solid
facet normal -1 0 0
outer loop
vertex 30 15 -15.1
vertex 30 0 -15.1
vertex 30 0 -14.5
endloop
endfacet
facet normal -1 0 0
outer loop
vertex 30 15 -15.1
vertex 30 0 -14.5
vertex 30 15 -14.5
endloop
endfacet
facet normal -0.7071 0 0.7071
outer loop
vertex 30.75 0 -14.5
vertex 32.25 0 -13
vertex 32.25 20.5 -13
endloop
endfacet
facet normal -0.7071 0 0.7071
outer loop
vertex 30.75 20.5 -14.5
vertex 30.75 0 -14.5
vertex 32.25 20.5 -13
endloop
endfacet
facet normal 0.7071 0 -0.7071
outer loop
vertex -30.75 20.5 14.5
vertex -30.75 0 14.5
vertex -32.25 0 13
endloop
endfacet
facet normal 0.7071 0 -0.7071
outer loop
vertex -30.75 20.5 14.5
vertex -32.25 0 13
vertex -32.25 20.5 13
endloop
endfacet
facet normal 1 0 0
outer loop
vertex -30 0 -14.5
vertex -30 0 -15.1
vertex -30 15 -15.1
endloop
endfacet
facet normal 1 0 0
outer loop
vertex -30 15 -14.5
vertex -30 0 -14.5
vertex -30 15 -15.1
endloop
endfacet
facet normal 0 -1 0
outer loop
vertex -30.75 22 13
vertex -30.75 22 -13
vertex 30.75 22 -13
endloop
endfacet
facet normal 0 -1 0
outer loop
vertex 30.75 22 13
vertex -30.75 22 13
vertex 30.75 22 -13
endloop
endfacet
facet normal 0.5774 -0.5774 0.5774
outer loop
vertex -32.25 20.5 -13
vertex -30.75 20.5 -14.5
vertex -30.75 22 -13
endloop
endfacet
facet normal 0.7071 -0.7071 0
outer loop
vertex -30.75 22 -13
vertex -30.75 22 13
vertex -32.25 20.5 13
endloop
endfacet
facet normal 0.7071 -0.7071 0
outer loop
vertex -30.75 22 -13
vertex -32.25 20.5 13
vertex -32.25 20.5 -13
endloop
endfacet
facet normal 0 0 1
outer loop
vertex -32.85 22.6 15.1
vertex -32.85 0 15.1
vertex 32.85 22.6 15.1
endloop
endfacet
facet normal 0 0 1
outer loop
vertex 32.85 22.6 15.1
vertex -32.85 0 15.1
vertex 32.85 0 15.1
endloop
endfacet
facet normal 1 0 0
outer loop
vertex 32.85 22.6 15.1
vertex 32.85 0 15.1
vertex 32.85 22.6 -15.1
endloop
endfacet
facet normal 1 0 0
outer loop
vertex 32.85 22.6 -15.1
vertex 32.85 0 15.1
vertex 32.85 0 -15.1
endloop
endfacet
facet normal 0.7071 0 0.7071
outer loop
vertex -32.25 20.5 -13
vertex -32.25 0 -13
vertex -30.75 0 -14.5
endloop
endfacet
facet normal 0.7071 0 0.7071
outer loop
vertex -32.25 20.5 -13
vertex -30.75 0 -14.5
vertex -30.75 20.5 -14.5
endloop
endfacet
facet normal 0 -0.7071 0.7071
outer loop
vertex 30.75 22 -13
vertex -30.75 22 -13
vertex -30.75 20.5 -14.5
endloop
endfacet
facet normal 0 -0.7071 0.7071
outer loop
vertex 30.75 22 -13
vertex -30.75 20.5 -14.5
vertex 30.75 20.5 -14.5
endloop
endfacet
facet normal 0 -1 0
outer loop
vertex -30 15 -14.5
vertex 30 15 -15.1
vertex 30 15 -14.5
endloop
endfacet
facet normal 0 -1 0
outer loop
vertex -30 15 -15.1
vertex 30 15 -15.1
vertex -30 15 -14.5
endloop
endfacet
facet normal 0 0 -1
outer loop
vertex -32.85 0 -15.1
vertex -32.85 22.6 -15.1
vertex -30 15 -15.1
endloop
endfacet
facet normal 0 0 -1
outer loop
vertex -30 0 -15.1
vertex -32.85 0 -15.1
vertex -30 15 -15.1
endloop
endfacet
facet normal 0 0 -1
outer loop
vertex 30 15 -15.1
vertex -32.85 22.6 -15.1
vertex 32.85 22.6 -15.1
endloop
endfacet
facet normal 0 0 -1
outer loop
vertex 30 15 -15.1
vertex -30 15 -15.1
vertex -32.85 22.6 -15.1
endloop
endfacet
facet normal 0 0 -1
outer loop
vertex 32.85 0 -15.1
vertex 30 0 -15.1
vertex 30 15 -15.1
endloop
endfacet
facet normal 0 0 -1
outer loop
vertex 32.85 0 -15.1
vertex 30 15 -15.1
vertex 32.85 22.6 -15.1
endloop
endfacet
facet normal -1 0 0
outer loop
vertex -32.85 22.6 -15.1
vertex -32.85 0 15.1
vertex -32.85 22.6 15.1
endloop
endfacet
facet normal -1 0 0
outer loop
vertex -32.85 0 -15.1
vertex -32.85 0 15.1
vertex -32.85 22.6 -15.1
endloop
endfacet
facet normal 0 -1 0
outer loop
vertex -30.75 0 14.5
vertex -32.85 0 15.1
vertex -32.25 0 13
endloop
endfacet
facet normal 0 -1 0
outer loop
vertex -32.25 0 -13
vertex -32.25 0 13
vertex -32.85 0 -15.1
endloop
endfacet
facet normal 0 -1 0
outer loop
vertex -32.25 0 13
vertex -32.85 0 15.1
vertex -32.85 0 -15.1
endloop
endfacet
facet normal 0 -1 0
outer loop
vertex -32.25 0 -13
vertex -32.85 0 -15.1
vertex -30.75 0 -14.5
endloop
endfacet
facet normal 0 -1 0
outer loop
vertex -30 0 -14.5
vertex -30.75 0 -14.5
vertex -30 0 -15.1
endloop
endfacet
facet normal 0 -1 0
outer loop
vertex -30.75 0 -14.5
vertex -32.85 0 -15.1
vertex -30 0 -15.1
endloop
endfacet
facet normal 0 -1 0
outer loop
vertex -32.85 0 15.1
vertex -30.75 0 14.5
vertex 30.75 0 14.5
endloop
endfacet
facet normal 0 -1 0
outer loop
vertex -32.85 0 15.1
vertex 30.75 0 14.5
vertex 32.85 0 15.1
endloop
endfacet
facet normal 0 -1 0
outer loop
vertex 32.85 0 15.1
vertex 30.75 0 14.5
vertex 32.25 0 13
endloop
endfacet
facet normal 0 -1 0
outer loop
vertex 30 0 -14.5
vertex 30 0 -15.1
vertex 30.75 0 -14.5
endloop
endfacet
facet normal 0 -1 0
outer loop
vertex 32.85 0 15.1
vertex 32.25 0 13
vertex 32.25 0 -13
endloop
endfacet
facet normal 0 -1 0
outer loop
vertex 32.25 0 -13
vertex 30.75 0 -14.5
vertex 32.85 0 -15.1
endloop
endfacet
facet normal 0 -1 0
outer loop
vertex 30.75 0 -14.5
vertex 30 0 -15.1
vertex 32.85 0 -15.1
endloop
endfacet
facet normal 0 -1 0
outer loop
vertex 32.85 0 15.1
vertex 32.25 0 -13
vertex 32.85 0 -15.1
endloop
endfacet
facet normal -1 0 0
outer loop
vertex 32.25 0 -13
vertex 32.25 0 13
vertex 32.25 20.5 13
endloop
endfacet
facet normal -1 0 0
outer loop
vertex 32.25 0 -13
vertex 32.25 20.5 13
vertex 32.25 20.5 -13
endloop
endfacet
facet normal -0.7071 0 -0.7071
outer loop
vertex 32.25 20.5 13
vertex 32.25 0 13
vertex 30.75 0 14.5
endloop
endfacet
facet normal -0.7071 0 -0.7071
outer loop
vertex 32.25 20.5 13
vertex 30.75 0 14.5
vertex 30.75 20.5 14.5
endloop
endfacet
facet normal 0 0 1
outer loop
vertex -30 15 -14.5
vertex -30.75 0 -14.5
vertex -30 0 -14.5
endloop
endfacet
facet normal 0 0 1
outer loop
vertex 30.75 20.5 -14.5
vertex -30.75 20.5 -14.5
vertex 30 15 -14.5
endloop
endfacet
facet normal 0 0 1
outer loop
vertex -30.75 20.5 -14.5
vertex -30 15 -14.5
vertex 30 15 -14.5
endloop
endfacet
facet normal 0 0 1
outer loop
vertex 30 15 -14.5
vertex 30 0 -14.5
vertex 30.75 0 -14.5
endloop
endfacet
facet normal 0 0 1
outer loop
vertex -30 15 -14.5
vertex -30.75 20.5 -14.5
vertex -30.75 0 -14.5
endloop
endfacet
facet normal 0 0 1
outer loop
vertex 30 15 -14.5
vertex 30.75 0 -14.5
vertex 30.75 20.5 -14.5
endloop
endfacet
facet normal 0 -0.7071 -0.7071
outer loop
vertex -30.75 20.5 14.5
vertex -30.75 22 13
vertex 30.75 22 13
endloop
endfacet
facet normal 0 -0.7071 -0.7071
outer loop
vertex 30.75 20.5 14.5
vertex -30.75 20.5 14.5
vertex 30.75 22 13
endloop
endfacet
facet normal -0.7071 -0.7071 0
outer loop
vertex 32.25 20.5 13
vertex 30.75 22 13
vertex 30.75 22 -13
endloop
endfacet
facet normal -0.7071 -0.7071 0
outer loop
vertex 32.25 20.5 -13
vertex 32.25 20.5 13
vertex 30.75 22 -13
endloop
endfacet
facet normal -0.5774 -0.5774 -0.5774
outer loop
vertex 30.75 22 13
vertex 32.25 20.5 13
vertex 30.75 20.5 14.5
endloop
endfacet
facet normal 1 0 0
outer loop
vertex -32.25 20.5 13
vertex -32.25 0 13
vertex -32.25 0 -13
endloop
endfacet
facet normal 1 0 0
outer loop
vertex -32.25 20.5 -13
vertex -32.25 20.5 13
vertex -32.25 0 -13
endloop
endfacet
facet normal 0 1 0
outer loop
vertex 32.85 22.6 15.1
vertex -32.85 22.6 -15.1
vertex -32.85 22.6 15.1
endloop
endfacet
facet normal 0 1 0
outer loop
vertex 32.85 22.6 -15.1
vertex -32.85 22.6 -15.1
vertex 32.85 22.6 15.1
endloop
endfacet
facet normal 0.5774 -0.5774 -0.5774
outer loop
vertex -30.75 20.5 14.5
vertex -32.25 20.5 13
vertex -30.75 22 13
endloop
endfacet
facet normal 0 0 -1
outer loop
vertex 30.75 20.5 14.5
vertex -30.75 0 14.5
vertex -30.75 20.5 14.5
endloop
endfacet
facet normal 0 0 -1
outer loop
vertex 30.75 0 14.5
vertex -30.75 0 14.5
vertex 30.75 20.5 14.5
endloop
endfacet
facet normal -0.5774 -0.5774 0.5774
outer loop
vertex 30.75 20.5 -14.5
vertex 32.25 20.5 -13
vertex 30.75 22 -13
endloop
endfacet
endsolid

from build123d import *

# Parameters (mm, degrees)
SKETCH1_W           = 65.7
SKETCH1_H           = 30.2
SKETCH1_W_2         = 64.5
SKETCH1_H_2         = 29
BOSS_EXTRUDE1_DEPTH = 22
SKETCH2_W           = 65.7
SKETCH2_H           = 30.2
BOSS_EXTRUDE2_DEPTH = 0.6
SKETCH3_W           = 60
SKETCH3_H           = 15
CUT_EXTRUDE1_DEPTH  = 10.6
CHAMFER1_SIZE       = 1.5


with BuildPart() as part:
    # Sketch1 → Boss-Extrude1 (new body)
    with BuildSketch(Plane(origin=(0, 0, 0), x_dir=(1, 0, 0), z_dir=(0, 1, 0))):
        Rectangle(SKETCH1_W, SKETCH1_H)
        Rectangle(SKETCH1_W_2, SKETCH1_H_2, mode=Mode.SUBTRACT)
    extrude(amount=BOSS_EXTRUDE1_DEPTH)

    # Sketch2 → Boss-Extrude2 (add)
    with BuildSketch(Plane(origin=(0, 22, 0), x_dir=(1, 0, 0), z_dir=(0, 1, 0))):
        Rectangle(SKETCH2_W, SKETCH2_H)
    extrude(amount=BOSS_EXTRUDE2_DEPTH)

    # Sketch3 → Cut-Extrude1 (cut)
    with BuildSketch(Plane(origin=(0, 0, -15.1), x_dir=(-1, 0, 0), z_dir=(0, 0, -1))):
        with Locations((0, 7.5)):
            Rectangle(SKETCH3_W, SKETCH3_H)
    extrude(amount=-CUT_EXTRUDE1_DEPTH, mode=Mode.SUBTRACT)

    # Chamfer1
    chamfer1_edges = [part.edges().sort_by_distance(p)[0] for p in [
        (32.25, 11, 14.5),
        (32.25, 11, -14.5),
        (-32.25, 11, -14.5),
        (-32.25, 11, 14.5),
        (32.25, 22, 0),
        (0, 22, -14.5),
        (-32.25, 22, 0),
        (0, 22, 14.5),
    ]]
    chamfer(chamfer1_edges, length=CHAMFER1_SIZE)


solid = part.part
